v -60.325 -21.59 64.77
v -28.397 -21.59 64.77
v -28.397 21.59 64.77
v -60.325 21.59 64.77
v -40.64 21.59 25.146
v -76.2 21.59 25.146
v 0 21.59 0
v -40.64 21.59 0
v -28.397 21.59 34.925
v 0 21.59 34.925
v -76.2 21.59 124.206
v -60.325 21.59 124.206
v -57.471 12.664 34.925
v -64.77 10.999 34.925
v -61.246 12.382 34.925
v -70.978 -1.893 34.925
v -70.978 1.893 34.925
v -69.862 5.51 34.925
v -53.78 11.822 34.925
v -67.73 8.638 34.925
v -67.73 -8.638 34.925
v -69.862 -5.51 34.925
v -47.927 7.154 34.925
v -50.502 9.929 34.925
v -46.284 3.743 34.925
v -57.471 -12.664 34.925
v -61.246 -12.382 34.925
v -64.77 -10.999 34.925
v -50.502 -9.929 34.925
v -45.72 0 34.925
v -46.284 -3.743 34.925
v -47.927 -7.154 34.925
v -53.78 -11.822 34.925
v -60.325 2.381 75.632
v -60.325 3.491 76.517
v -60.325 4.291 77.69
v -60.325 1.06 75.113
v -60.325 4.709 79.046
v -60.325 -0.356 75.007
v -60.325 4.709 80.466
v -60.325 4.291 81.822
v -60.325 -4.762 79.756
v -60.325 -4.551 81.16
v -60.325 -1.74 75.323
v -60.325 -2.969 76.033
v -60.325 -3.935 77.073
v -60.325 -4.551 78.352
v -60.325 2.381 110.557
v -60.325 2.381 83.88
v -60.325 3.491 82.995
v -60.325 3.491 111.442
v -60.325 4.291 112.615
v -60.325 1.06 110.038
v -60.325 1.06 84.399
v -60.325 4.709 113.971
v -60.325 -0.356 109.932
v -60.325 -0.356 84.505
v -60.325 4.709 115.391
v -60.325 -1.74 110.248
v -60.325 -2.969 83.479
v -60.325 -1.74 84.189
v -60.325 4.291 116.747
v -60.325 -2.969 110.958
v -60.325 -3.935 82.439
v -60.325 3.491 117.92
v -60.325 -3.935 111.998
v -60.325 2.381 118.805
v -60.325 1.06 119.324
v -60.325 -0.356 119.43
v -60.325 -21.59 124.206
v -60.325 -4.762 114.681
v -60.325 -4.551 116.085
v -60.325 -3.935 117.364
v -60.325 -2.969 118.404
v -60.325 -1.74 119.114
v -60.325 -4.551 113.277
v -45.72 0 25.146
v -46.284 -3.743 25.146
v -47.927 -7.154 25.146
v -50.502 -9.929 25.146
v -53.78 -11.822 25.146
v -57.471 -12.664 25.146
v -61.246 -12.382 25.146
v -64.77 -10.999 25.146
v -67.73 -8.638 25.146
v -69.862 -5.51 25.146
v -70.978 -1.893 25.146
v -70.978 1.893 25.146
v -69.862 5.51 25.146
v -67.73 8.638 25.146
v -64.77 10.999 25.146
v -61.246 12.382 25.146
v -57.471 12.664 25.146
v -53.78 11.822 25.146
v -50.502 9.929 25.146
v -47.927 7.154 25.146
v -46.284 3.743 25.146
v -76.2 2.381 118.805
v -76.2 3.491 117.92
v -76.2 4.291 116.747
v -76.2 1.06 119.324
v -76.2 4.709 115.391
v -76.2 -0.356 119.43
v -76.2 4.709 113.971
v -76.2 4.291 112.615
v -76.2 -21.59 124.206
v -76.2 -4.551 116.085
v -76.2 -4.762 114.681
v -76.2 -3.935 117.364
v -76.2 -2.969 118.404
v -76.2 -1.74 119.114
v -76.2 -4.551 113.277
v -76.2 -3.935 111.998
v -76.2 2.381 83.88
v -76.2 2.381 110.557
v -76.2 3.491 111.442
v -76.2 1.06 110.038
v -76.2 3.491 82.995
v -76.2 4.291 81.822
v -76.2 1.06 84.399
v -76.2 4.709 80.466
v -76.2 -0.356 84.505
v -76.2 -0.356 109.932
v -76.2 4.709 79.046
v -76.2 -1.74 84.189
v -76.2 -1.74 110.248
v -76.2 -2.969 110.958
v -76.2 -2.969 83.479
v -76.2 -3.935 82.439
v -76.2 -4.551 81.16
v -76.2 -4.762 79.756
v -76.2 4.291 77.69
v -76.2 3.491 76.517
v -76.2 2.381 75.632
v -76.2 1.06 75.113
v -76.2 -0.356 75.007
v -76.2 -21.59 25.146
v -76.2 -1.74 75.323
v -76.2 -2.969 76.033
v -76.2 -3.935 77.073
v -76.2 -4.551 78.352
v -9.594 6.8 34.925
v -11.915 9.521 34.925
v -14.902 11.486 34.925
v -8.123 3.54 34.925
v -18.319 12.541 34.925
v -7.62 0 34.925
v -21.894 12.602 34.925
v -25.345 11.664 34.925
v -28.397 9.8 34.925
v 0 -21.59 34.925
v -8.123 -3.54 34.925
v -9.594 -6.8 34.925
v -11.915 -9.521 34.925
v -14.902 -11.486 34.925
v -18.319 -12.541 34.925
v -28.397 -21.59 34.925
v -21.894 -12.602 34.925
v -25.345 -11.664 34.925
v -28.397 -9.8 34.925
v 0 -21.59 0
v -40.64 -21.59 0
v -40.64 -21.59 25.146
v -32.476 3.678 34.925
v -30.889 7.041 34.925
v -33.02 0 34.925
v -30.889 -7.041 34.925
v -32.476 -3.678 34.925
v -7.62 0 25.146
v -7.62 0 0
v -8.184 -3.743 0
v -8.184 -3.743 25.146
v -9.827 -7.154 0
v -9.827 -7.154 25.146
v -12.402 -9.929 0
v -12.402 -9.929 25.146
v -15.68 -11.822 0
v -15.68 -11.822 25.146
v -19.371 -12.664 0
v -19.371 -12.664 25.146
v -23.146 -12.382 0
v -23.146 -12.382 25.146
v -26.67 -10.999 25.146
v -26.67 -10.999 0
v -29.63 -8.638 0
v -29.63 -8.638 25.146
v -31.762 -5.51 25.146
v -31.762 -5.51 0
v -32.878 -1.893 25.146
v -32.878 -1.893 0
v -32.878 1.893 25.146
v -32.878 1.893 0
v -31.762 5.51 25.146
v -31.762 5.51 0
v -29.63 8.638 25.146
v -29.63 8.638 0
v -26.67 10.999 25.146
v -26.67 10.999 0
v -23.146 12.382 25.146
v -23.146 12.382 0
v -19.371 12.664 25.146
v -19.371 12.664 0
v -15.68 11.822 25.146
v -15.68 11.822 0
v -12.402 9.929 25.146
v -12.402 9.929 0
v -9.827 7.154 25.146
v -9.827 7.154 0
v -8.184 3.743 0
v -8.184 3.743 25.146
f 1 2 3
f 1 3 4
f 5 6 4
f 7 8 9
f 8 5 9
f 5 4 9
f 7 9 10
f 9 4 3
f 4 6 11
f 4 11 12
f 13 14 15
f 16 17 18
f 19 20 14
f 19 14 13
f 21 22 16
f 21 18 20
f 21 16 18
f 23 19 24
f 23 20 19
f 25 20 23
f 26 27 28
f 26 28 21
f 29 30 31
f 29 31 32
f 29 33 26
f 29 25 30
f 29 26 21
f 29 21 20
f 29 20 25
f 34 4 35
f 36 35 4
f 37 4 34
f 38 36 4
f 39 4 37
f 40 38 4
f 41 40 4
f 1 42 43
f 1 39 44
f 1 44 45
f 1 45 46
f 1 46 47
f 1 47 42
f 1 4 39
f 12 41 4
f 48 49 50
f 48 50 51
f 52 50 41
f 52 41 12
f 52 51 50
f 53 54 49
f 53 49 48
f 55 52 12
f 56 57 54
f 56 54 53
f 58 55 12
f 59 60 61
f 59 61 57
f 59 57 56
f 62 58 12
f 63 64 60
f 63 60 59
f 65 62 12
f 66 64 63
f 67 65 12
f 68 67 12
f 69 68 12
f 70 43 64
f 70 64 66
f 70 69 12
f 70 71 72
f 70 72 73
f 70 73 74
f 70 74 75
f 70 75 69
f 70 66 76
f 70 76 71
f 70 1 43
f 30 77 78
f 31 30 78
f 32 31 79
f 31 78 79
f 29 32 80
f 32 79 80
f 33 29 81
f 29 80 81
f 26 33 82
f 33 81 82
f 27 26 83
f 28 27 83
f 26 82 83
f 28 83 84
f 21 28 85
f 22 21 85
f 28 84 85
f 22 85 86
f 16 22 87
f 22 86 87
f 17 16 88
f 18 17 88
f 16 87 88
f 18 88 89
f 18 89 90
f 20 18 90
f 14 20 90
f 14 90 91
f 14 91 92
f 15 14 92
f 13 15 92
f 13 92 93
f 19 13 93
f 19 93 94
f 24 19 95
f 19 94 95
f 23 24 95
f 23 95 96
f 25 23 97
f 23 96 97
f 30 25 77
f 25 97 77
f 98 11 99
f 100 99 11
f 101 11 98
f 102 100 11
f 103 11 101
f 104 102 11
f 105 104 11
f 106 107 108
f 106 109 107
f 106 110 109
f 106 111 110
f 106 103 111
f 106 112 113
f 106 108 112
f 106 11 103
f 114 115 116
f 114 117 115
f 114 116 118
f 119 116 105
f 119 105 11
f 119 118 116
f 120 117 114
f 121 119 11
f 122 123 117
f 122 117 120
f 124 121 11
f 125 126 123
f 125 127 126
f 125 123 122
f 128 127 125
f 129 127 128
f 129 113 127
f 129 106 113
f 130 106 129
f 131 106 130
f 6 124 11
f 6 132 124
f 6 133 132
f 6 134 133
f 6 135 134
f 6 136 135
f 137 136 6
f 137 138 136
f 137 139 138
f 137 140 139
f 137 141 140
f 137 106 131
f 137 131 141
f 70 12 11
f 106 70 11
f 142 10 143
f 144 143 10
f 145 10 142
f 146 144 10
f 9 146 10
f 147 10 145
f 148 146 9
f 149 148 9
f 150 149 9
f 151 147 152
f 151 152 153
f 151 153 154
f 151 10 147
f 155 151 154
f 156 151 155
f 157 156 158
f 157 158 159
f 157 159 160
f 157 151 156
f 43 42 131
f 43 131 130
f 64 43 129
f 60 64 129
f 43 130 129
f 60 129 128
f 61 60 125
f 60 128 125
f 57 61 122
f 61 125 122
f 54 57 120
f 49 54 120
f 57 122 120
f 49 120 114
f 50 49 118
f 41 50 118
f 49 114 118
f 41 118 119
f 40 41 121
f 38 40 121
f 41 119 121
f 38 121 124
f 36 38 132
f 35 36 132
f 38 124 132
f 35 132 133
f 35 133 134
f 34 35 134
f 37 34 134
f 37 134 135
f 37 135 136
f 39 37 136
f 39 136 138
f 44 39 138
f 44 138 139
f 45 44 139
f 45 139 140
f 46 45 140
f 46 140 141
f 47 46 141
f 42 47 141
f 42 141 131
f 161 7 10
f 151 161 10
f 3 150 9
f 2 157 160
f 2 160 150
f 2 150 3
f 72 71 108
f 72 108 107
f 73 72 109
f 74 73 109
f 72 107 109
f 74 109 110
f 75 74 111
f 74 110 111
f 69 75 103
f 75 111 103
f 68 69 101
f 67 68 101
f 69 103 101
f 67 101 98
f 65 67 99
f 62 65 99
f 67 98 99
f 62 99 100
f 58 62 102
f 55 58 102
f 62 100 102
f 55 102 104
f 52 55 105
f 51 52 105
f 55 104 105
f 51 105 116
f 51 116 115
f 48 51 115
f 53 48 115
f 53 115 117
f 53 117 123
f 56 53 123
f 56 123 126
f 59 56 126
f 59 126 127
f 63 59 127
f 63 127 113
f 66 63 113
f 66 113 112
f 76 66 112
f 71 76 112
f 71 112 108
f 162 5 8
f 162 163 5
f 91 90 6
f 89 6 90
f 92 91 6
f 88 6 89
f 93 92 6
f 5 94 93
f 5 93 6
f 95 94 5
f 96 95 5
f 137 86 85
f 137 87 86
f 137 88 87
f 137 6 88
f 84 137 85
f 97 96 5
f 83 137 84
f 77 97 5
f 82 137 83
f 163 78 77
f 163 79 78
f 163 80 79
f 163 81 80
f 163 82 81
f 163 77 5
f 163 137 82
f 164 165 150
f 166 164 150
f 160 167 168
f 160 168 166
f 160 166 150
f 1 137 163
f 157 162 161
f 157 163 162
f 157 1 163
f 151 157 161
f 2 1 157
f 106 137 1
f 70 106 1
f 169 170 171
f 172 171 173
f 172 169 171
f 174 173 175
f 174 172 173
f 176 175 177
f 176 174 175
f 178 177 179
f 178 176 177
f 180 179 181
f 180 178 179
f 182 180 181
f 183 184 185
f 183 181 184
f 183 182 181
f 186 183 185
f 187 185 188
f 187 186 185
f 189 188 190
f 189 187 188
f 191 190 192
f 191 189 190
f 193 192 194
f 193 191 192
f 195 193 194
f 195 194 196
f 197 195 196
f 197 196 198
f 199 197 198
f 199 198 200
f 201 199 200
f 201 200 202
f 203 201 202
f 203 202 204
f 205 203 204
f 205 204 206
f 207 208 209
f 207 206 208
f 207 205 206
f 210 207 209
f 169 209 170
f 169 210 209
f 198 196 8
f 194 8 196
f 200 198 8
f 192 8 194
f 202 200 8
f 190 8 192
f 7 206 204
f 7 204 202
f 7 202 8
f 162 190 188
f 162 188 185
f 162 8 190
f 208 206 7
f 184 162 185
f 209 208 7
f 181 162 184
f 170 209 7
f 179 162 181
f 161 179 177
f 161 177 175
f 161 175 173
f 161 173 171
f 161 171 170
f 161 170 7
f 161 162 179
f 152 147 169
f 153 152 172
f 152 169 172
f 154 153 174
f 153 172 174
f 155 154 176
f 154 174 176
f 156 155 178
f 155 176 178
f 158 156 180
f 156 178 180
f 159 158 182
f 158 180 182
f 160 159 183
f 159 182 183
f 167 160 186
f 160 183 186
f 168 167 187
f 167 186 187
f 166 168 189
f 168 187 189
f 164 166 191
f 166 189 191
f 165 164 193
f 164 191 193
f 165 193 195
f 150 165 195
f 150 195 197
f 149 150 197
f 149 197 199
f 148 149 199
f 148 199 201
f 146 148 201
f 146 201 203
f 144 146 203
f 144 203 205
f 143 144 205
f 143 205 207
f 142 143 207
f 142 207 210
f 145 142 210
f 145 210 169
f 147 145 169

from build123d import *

# Parameters (mm, degrees)
F1_DEPTH      = 21.59
F2_R          = 4.7625
F3_DEPTH      = 76.201
F4_R          = 12.7
F5_DEPTH      = 9.779
F5_DEPTH_BACK = 25.147


with BuildPart() as f1:
    # F0 (on Front) → F1 (new body, symmetric)
    with BuildSketch(Plane.XZ):
        Polygon((-40.64, 0), (0, 0), (0, 34.925), (-28.3972, 34.925), (-28.3972, 64.77), (-60.325, 64.77), (-60.325, 124.206), (-76.2, 124.206), (-76.2, 25.146), (-40.64, 25.146), align=None)
    extrude(amount=F1_DEPTH, both=True)

    # F2 (on face) → F3 (cut, through all)
    with BuildSketch(Plane(origin=(-76.2, 0, 0), x_dir=(0, -1, 0), z_dir=(-1, 0, 0))):
        with Locations((0, 114.681)):
            Circle(F2_R)
        with Locations((0, 79.756)):
            Circle(F2_R)
    extrude(amount=-F3_DEPTH, mode=Mode.SUBTRACT)

    # F4 (on face) → F5 (cut, two sides)
    with BuildSketch(Plane(origin=(0, 0, 25.146), x_dir=(1, 0, 0), z_dir=(0, 0, -1))) as f5_sk:
        with Locations((-58.42, 0)):
            Circle(F4_R)
        with Locations((-20.32, 0)):
            Circle(F4_R)
    extrude(amount=-F5_DEPTH, mode=Mode.SUBTRACT)
    extrude(f5_sk.sketch, amount=F5_DEPTH_BACK, mode=Mode.SUBTRACT)


solid = f1.part
